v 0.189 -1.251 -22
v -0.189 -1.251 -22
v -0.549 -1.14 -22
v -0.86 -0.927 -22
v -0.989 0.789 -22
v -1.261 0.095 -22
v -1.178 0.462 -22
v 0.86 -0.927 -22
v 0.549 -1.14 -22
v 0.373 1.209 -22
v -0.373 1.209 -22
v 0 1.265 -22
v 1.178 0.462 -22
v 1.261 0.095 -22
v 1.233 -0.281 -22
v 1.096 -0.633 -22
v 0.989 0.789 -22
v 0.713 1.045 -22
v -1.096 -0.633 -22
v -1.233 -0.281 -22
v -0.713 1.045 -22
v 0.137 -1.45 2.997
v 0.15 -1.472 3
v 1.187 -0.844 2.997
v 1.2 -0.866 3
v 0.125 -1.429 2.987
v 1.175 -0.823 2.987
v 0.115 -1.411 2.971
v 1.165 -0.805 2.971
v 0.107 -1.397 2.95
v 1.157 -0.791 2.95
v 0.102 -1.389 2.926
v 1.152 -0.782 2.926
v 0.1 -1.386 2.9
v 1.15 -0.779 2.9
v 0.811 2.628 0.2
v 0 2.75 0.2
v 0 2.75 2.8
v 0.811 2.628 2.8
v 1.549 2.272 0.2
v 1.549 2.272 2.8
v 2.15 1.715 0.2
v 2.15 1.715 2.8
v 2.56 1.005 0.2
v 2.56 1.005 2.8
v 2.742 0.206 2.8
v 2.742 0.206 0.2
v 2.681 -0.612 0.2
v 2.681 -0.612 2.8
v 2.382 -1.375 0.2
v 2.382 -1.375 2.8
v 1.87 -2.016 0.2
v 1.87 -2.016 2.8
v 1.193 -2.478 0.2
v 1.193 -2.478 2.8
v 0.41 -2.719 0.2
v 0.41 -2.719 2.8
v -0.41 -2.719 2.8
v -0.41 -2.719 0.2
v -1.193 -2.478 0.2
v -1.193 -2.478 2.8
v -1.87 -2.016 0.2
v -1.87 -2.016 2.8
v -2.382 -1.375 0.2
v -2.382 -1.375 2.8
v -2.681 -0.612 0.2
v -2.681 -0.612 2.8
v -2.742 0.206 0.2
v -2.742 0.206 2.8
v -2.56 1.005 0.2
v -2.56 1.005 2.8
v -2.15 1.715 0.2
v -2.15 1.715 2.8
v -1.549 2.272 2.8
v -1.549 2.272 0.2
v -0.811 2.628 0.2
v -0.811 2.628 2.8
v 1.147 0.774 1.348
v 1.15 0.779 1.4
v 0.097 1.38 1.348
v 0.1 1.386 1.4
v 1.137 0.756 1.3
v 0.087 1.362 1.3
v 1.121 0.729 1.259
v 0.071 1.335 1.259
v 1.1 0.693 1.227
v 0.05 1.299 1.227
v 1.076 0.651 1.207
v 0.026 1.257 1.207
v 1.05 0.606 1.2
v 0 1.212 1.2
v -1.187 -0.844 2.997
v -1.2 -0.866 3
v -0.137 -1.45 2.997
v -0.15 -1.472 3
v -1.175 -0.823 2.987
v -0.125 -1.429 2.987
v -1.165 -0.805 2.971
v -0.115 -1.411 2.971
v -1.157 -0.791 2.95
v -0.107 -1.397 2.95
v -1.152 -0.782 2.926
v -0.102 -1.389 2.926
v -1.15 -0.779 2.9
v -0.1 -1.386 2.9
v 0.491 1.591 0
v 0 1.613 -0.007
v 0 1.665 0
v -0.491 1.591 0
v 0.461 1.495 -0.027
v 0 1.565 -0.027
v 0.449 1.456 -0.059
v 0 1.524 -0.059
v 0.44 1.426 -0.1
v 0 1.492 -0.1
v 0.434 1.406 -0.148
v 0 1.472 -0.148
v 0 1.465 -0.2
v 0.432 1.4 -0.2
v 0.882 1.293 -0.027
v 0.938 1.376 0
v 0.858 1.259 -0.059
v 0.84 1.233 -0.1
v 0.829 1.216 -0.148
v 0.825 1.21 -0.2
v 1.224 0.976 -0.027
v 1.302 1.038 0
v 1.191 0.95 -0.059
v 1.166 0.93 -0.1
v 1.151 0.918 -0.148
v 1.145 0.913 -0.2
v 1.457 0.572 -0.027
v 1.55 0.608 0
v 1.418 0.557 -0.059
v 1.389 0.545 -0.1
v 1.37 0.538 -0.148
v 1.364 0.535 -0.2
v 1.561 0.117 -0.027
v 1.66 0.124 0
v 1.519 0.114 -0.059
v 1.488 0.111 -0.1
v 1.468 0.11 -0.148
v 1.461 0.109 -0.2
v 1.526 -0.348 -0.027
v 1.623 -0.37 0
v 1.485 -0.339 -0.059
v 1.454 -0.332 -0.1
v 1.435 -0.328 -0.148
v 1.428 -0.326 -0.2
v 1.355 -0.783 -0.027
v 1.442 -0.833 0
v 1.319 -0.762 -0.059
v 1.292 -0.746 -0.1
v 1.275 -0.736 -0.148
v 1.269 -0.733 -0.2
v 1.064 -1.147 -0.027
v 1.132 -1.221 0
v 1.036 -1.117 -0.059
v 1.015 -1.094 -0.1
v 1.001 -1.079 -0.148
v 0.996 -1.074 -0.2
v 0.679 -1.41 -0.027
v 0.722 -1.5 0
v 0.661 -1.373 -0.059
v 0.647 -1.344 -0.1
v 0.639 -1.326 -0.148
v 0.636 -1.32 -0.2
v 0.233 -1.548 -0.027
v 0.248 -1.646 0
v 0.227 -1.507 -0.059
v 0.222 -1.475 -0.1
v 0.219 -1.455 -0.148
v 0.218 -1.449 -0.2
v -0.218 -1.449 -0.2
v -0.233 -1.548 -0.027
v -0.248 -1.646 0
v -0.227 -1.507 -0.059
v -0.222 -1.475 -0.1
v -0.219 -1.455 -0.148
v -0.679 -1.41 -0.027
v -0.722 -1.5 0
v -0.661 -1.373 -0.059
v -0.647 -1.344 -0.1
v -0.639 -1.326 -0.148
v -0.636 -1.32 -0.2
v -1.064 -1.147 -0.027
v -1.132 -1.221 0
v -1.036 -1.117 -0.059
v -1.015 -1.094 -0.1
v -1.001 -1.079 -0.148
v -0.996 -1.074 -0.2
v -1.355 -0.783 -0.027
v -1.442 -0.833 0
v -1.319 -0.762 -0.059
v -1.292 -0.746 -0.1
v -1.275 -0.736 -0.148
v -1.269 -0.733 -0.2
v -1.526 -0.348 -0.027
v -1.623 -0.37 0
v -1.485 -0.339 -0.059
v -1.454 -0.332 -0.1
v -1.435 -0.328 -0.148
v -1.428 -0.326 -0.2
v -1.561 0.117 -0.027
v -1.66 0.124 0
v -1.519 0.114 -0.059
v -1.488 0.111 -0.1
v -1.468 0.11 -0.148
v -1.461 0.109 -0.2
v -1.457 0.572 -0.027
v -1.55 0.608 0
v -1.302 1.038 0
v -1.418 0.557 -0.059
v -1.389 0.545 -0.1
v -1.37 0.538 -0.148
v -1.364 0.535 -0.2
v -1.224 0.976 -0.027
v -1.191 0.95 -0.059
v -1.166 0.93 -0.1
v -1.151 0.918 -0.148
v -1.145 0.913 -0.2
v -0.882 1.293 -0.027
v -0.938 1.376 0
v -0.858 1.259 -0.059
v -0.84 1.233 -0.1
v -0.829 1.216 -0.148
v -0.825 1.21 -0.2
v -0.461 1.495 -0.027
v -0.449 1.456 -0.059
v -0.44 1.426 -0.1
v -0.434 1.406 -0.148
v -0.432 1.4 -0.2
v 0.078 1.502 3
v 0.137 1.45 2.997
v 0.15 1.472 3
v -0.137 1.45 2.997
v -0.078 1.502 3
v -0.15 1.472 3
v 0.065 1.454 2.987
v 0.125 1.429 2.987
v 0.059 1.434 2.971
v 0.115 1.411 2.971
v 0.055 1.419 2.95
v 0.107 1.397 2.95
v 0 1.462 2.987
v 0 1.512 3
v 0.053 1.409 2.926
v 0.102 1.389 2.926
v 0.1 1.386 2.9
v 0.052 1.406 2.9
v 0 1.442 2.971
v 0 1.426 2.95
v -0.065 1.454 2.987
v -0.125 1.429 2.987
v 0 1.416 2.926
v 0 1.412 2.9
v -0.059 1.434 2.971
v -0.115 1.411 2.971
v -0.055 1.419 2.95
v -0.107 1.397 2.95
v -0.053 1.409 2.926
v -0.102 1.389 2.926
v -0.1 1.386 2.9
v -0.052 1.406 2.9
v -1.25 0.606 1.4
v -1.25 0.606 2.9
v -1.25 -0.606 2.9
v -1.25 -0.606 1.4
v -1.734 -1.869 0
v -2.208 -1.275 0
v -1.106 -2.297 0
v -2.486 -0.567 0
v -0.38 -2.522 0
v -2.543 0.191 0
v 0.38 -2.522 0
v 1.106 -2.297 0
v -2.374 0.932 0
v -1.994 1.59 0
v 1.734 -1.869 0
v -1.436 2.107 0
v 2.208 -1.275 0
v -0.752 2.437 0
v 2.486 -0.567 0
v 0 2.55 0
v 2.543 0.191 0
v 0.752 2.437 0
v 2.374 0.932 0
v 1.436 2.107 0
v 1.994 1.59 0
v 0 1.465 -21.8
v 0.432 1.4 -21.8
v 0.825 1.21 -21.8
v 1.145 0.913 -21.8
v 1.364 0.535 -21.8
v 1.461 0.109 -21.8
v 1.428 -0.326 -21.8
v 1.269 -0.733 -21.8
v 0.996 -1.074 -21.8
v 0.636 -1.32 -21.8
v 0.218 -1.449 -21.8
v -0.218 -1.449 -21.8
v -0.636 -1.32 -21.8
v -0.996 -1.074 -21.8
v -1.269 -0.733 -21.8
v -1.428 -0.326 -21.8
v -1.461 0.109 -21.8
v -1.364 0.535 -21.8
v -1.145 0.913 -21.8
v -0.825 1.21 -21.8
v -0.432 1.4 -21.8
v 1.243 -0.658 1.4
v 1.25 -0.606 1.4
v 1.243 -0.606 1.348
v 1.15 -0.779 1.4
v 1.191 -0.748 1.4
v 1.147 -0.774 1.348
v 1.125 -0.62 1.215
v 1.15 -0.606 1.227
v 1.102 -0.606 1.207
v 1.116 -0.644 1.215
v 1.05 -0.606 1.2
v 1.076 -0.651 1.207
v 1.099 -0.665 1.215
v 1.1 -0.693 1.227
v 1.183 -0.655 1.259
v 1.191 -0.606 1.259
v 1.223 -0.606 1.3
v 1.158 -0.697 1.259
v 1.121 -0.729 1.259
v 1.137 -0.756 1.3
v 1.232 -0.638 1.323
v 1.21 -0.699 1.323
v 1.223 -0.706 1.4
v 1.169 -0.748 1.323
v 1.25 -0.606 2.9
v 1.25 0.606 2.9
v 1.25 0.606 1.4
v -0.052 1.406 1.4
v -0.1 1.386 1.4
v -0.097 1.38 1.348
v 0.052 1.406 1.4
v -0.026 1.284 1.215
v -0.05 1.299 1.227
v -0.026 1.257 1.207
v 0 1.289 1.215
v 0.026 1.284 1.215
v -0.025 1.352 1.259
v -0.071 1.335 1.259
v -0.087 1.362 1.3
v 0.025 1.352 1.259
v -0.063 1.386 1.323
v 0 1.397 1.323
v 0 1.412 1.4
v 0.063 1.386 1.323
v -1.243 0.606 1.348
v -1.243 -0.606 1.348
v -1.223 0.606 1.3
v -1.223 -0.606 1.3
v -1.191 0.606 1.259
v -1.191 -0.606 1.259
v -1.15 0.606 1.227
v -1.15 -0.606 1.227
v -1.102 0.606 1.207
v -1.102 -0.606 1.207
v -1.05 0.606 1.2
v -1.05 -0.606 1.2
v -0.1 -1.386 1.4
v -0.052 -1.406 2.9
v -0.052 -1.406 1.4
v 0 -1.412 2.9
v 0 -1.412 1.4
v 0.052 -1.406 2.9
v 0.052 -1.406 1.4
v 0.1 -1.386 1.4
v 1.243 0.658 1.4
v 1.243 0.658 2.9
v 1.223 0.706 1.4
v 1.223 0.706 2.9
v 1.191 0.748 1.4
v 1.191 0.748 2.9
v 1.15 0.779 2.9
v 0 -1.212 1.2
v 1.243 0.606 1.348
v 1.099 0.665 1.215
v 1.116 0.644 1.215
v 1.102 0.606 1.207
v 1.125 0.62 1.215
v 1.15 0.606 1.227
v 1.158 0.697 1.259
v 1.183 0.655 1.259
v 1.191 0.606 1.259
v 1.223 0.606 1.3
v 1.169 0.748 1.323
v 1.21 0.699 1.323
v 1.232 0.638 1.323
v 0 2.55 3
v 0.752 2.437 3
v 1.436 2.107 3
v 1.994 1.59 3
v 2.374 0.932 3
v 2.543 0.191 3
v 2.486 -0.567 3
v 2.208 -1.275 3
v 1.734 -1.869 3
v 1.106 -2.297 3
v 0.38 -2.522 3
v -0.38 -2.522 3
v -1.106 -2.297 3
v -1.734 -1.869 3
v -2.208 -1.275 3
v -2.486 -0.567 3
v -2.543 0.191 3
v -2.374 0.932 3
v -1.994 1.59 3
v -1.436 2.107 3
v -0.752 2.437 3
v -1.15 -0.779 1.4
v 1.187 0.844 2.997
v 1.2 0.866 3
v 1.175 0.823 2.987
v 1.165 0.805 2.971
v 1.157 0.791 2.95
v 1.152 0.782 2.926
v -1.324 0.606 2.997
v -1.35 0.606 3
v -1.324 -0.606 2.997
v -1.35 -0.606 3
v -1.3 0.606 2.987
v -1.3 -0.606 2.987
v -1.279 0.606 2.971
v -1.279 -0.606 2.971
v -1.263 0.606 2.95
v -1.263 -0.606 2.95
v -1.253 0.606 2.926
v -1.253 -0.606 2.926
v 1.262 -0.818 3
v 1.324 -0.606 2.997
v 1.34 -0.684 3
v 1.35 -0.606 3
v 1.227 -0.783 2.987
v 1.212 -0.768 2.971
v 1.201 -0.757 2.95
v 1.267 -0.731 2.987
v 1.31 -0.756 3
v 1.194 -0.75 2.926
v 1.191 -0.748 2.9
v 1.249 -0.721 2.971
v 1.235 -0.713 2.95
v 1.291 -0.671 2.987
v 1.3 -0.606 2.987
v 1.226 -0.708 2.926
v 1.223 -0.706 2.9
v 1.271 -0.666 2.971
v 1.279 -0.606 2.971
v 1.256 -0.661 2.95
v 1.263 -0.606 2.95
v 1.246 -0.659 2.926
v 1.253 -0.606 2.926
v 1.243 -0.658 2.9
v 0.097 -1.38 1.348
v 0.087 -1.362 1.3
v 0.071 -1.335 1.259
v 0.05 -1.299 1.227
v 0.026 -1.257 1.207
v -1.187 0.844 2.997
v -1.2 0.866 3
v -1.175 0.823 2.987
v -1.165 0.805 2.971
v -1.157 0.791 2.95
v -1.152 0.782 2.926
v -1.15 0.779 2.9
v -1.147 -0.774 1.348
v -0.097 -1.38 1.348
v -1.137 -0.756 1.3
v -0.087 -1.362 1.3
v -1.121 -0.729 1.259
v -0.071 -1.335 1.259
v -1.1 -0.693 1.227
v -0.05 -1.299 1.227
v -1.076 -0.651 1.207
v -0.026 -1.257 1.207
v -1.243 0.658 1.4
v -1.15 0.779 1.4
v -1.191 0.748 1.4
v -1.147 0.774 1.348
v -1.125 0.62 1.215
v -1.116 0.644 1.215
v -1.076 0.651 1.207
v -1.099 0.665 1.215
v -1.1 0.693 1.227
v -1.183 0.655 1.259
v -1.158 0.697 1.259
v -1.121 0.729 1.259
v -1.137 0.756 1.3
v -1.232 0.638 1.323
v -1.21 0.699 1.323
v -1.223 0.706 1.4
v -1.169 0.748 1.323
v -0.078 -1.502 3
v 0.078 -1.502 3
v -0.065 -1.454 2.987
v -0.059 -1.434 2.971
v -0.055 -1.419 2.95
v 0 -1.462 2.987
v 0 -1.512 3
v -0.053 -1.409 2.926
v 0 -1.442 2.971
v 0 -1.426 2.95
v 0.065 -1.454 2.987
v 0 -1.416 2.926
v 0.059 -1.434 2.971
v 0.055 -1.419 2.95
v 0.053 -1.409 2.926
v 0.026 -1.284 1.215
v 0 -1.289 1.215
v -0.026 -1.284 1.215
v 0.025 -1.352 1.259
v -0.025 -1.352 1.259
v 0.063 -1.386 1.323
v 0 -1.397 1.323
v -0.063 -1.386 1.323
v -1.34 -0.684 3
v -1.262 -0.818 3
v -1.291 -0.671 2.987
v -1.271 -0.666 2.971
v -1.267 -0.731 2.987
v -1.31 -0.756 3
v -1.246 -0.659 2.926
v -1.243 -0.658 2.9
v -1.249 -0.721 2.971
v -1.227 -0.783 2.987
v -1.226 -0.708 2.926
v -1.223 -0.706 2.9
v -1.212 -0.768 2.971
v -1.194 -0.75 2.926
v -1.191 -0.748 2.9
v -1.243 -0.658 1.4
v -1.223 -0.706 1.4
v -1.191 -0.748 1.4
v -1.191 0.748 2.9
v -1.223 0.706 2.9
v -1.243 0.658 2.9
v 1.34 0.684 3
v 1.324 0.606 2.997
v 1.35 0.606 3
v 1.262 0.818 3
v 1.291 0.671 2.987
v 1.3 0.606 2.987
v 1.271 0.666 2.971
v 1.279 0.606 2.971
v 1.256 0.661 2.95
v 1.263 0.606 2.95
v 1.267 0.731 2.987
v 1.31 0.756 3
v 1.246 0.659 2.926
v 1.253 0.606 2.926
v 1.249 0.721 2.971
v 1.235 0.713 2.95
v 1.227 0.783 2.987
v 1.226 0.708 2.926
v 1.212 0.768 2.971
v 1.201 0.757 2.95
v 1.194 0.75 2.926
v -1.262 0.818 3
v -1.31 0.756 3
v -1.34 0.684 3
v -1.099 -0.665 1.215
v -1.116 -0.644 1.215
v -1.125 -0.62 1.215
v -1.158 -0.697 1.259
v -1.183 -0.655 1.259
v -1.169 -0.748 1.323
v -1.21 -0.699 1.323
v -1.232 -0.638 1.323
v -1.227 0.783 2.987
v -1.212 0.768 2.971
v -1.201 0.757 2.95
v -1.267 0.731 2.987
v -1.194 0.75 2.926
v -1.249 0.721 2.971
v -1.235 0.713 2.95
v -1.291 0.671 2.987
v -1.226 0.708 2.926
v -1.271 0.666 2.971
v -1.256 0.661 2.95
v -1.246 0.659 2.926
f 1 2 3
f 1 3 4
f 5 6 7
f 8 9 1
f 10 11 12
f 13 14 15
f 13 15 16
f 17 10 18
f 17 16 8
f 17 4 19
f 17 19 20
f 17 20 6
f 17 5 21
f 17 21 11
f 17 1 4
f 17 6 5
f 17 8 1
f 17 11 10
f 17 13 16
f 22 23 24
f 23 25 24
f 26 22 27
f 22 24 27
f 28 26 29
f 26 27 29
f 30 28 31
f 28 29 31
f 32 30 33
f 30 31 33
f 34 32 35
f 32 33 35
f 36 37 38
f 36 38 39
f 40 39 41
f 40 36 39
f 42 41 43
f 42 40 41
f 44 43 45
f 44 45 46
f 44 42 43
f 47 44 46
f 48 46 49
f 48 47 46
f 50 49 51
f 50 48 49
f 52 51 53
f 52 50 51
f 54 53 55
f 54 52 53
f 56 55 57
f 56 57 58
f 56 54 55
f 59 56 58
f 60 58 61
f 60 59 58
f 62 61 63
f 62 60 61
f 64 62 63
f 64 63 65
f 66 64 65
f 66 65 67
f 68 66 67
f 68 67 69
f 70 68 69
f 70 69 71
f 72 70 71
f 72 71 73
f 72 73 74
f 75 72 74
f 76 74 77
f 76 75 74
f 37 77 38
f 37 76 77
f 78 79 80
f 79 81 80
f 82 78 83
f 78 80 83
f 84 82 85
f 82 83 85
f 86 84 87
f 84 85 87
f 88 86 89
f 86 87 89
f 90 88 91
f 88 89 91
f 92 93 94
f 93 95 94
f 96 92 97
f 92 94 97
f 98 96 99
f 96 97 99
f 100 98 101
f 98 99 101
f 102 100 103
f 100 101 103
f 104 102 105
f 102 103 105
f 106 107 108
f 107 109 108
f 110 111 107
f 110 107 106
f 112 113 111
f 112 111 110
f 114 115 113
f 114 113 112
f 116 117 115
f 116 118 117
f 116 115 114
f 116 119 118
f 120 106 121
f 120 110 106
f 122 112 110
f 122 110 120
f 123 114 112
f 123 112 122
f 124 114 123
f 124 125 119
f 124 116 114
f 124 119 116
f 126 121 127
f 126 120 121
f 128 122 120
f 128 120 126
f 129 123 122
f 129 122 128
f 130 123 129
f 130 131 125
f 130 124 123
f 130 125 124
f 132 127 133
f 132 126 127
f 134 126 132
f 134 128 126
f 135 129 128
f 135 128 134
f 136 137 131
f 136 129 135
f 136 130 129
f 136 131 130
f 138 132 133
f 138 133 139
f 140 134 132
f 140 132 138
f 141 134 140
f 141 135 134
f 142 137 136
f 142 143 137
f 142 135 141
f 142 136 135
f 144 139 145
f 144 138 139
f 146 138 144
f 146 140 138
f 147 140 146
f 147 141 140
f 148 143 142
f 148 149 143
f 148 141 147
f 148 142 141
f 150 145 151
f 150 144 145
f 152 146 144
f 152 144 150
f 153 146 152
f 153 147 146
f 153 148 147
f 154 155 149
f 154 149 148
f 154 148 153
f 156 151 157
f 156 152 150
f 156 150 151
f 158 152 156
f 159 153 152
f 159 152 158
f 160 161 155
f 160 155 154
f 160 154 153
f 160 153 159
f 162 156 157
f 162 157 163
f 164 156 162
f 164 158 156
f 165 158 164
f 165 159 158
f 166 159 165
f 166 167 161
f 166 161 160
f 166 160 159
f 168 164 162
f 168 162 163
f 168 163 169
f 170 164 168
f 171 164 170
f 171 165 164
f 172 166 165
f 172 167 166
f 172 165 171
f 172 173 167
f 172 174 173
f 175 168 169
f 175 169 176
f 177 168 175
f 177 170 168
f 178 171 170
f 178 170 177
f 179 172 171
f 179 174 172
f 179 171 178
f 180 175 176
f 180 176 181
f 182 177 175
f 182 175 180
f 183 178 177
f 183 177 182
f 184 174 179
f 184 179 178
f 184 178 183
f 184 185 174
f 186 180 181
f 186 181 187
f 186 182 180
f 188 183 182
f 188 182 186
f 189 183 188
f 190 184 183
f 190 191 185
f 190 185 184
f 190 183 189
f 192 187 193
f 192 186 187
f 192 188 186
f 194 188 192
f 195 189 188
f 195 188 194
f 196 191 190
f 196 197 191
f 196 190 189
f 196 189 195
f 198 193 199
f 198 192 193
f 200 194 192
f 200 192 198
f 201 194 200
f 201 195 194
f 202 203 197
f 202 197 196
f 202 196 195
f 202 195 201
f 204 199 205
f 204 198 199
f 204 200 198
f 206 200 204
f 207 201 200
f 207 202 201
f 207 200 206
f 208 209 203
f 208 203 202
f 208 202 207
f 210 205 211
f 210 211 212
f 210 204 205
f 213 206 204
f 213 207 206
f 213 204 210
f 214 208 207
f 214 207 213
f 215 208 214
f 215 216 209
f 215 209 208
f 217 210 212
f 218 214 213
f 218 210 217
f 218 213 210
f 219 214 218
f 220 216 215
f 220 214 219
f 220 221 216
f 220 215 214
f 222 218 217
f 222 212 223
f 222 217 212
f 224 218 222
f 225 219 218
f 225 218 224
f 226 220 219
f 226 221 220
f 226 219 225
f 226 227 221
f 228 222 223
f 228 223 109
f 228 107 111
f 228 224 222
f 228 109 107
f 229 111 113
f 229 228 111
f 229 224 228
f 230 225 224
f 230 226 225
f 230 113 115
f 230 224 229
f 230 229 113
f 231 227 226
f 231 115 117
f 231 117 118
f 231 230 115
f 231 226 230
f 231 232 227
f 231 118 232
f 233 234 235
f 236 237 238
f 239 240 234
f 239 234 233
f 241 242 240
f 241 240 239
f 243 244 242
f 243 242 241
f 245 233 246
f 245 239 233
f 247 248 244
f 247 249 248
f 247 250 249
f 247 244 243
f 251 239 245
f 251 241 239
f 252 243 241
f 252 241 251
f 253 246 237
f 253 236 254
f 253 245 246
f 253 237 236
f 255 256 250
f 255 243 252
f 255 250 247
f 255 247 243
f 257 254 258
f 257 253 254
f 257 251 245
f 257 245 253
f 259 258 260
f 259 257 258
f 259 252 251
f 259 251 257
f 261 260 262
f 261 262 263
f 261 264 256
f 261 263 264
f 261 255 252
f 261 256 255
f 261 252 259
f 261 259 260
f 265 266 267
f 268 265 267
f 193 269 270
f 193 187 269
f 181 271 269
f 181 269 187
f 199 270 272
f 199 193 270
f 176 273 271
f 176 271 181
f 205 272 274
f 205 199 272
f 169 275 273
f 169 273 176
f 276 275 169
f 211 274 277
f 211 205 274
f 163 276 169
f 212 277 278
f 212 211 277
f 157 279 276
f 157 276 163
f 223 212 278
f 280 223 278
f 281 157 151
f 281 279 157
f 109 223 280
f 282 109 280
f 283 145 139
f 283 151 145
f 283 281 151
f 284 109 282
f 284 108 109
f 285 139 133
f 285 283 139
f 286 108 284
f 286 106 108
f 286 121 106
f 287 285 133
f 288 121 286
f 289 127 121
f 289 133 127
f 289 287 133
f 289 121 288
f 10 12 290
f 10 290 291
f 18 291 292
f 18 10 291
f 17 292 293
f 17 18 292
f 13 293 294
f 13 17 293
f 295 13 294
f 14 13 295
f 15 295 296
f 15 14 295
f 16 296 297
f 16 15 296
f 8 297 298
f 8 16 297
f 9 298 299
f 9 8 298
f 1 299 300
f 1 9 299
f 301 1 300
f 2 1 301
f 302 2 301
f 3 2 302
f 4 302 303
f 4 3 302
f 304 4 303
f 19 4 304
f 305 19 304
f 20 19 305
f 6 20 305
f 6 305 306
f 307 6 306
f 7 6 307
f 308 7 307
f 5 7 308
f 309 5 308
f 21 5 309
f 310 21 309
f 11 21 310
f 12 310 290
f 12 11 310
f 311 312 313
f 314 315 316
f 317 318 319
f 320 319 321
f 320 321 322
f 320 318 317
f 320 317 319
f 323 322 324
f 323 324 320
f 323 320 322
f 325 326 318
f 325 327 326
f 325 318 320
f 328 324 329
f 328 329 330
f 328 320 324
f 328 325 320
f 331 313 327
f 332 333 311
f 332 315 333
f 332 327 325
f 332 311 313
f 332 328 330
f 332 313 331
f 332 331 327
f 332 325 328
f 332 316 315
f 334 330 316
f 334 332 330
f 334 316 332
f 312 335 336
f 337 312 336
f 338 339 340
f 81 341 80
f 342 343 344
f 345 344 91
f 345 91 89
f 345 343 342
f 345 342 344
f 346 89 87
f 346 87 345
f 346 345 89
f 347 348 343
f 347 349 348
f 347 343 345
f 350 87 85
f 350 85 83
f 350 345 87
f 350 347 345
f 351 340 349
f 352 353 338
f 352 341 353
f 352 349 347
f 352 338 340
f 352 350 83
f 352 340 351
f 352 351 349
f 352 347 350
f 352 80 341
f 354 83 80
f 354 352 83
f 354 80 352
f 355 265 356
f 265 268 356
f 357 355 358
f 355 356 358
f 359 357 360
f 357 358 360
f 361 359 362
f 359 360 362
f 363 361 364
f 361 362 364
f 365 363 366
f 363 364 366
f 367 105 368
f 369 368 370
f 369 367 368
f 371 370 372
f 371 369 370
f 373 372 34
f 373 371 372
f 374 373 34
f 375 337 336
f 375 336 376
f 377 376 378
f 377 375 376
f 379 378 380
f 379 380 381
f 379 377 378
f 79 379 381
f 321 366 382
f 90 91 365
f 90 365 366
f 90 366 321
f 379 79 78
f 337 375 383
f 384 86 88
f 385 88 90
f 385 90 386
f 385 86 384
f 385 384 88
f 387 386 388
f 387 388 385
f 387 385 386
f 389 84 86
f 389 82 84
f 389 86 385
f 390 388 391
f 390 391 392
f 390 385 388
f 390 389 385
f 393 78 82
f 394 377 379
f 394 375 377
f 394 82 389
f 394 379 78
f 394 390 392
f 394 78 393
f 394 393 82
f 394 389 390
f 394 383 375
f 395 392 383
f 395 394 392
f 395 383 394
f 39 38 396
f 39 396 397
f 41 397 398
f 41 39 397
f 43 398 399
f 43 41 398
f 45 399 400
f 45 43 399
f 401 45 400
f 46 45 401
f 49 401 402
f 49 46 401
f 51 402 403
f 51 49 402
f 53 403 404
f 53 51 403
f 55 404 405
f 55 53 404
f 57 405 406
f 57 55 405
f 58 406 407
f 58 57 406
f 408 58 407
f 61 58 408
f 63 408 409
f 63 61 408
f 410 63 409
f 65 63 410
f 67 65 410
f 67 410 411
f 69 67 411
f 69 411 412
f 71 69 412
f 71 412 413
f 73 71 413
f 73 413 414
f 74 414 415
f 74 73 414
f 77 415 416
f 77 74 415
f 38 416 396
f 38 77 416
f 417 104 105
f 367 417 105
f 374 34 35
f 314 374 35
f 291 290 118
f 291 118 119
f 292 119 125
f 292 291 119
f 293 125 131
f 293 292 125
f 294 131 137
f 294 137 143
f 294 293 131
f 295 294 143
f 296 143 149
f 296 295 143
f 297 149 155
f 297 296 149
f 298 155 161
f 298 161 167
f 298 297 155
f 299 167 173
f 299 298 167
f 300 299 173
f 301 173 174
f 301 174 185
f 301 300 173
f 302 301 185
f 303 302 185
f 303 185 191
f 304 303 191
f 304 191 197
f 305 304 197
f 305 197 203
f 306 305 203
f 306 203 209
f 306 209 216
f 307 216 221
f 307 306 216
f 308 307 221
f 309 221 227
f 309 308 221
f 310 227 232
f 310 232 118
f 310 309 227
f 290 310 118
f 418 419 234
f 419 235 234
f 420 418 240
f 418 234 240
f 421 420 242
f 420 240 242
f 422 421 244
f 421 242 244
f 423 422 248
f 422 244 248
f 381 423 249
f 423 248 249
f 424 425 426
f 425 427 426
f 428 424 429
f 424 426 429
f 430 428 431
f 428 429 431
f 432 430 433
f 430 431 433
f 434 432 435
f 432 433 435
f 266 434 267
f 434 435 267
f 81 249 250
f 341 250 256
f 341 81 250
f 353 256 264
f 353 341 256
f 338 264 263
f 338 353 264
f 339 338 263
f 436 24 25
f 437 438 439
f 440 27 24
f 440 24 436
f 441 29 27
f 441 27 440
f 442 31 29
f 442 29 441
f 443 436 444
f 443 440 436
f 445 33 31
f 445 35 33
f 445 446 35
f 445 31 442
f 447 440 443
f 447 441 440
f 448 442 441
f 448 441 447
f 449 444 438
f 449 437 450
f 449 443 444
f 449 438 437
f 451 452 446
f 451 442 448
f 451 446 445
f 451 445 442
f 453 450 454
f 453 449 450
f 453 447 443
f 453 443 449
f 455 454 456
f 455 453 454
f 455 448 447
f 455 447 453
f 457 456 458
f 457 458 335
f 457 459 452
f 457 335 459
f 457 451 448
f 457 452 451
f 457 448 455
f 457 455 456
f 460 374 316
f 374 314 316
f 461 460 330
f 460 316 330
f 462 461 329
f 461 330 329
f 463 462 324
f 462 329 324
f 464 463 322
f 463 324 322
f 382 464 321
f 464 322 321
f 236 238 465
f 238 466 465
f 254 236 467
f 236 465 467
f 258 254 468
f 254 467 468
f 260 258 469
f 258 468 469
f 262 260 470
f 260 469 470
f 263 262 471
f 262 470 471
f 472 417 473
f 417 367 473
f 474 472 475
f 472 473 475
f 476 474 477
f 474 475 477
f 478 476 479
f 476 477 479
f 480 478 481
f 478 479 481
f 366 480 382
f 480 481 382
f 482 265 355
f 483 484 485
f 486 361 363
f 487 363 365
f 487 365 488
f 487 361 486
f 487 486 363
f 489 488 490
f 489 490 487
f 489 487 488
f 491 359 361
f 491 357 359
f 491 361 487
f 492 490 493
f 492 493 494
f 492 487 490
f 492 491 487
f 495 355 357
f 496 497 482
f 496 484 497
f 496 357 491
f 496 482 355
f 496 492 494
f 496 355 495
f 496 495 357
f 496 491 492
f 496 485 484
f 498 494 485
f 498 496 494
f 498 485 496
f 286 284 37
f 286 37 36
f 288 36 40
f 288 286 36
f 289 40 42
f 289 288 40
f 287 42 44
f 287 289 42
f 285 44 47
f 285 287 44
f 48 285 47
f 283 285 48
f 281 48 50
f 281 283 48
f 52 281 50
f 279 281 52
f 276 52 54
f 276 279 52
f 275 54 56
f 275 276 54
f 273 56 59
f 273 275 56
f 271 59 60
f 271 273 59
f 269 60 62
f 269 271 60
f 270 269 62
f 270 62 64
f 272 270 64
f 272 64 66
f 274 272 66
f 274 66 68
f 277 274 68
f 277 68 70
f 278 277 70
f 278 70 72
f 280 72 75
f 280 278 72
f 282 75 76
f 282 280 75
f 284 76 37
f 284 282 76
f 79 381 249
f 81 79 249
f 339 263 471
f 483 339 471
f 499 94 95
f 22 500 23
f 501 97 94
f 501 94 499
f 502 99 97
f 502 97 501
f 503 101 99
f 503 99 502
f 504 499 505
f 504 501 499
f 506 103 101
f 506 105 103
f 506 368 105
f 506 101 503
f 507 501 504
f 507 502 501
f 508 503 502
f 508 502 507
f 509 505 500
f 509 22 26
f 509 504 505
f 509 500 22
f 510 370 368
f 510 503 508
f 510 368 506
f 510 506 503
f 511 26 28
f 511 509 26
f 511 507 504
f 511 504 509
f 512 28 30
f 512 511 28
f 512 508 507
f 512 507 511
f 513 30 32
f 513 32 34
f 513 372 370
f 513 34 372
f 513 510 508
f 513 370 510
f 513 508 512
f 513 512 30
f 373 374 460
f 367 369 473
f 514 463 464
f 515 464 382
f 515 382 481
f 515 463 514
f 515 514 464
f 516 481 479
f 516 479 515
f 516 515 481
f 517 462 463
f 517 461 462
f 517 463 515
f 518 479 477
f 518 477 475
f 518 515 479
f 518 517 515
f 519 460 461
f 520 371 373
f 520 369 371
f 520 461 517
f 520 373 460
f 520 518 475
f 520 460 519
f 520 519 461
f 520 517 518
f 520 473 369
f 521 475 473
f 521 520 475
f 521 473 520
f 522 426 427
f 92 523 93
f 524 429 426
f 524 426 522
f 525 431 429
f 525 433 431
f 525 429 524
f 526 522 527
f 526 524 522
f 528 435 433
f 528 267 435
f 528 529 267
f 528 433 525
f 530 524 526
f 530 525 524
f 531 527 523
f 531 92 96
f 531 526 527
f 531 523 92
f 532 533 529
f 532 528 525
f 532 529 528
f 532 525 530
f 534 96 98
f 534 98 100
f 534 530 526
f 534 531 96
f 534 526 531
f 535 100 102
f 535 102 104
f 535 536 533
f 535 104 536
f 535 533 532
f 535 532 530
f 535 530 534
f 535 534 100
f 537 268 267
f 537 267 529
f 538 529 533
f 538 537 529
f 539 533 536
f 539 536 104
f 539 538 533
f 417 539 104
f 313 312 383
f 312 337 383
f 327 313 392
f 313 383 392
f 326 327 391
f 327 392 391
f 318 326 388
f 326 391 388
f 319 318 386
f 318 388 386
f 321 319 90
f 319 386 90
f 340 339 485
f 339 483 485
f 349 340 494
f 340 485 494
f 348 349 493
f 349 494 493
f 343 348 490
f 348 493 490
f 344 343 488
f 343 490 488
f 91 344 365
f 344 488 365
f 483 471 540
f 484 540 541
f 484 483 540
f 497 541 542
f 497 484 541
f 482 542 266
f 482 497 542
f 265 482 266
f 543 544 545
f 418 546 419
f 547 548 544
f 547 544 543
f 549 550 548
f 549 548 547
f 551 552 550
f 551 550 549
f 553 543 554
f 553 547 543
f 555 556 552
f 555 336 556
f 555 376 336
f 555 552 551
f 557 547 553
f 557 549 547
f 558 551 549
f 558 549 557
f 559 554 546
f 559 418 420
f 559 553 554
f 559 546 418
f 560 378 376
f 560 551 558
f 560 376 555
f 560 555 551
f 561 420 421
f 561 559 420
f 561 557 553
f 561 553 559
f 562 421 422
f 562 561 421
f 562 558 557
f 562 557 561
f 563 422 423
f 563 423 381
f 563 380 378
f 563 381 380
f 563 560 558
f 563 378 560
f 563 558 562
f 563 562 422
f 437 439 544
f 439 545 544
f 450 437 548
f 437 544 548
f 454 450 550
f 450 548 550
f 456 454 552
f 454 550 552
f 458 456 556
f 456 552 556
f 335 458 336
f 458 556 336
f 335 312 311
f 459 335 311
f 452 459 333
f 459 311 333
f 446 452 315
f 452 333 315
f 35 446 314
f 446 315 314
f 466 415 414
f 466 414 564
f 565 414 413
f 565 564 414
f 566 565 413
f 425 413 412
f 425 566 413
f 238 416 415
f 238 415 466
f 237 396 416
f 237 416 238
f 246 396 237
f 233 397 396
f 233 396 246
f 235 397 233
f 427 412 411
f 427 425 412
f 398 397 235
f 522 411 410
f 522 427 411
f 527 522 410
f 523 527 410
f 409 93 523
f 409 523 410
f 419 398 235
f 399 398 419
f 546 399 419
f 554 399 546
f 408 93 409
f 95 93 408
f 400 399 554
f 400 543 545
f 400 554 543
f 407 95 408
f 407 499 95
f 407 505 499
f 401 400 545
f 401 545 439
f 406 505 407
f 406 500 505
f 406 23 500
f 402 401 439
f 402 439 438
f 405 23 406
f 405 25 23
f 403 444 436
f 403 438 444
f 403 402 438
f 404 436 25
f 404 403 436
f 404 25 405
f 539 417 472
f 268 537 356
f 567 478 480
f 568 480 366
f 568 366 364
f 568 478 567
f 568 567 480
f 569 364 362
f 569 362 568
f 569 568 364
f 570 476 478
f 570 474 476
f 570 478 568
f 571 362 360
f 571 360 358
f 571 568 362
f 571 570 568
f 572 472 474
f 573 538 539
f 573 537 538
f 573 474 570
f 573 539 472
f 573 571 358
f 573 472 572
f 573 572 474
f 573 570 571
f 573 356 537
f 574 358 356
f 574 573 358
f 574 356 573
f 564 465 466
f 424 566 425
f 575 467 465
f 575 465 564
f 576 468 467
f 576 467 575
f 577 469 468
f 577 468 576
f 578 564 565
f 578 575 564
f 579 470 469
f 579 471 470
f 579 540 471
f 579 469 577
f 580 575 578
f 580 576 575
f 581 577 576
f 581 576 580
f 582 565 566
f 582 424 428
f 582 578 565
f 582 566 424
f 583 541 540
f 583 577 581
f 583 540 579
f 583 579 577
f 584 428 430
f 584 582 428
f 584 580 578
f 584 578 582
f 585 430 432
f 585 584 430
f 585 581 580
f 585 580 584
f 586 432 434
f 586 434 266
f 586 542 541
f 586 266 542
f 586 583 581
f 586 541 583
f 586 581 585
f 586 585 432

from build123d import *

# Parameters (mm, degrees)
SCHNITT_LINEAR_AUSTRAGEN1_DEPTH = 1.8
FASE1_SIZE                      = 0.2
VERRUNDUNG1_R                   = 0.2
VERRUNDUNG2_R                   = 0.1


with BuildPart() as part:
    # Skizze1 → Rotation1 (revolve)
    with BuildSketch(Plane(origin=(0, 0, 0), x_dir=(0, 0, -1), z_dir=(1, 0, 0))):
        Polygon((-3, 0), (-3, 2.75), (0, 2.75), (0, 1.465), (22, 1.465), (22, 0), align=None)
    revolve(axis=Axis((0, 0, 21.919879518), (0, 0, -1)))

    # Skizze2 → Schnitt-Linear austragen1 (cut)
    with BuildSketch(Plane.XY.offset(3)):
        Polygon((1.25, -0.721687836), (1.25, 0.721687836), (0, 1.443375673), (-1.25, 0.721687836), (-1.25, -0.721687836), (0, -1.443375673), align=None)
    extrude(amount=-SCHNITT_LINEAR_AUSTRAGEN1_DEPTH, mode=Mode.SUBTRACT)

    # Fase1
    fase1_edges = [part.edges().sort_by_distance(p)[0] for p in [
        (0, -1.465, -22),
        (0, -2.75, 0),
        (0, -2.75, 3),
    ]]
    chamfer(fase1_edges, length=FASE1_SIZE)

    # Verrundung1
    verrundung1_edges = [part.edges().sort_by_distance(p)[0] for p in [
        (0.625, -1.082531755, 1.2),
        (1.25, -0.721687836, 2.1),
        (-0.625, -1.082531755, 1.2),
        (0, -1.443375673, 2.1),
        (-1.25, 0, 1.2),
        (-1.25, -0.721687836, 2.1),
        (-0.625, 1.082531755, 1.2),
        (-1.25, 0.721687836, 2.1),
        (0.625, 1.082531755, 1.2),
        (0, 1.443375673, 2.1),
        (1.25, 0, 1.2),
        (1.25, 0.721687836, 2.1),
        (0, -1.465, 0),
    ]]
    fillet(verrundung1_edges, radius=VERRUNDUNG1_R)

    # Verrundung2
    verrundung2_edges = [part.edges().sort_by_distance(p)[0] for p in [
        (-0.625, -1.082531755, 3),
        (-1.25, 0, 3),
        (-0.625, 1.082531755, 3),
        (0.625, 1.082531755, 3),
        (1.25, 0, 3),
        (0.625, -1.082531755, 3),
        (-1.223205081, -0.706217783, 3),
        (0, -1.412435565, 3),
        (1.223205081, -0.706217783, 3),
        (1.223205081, 0.706217783, 3),
        (0, 1.412435565, 3),
        (-1.223205081, 0.706217783, 3),
    ]]
    fillet(verrundung2_edges, radius=VERRUNDUNG2_R)


solid = part.part
